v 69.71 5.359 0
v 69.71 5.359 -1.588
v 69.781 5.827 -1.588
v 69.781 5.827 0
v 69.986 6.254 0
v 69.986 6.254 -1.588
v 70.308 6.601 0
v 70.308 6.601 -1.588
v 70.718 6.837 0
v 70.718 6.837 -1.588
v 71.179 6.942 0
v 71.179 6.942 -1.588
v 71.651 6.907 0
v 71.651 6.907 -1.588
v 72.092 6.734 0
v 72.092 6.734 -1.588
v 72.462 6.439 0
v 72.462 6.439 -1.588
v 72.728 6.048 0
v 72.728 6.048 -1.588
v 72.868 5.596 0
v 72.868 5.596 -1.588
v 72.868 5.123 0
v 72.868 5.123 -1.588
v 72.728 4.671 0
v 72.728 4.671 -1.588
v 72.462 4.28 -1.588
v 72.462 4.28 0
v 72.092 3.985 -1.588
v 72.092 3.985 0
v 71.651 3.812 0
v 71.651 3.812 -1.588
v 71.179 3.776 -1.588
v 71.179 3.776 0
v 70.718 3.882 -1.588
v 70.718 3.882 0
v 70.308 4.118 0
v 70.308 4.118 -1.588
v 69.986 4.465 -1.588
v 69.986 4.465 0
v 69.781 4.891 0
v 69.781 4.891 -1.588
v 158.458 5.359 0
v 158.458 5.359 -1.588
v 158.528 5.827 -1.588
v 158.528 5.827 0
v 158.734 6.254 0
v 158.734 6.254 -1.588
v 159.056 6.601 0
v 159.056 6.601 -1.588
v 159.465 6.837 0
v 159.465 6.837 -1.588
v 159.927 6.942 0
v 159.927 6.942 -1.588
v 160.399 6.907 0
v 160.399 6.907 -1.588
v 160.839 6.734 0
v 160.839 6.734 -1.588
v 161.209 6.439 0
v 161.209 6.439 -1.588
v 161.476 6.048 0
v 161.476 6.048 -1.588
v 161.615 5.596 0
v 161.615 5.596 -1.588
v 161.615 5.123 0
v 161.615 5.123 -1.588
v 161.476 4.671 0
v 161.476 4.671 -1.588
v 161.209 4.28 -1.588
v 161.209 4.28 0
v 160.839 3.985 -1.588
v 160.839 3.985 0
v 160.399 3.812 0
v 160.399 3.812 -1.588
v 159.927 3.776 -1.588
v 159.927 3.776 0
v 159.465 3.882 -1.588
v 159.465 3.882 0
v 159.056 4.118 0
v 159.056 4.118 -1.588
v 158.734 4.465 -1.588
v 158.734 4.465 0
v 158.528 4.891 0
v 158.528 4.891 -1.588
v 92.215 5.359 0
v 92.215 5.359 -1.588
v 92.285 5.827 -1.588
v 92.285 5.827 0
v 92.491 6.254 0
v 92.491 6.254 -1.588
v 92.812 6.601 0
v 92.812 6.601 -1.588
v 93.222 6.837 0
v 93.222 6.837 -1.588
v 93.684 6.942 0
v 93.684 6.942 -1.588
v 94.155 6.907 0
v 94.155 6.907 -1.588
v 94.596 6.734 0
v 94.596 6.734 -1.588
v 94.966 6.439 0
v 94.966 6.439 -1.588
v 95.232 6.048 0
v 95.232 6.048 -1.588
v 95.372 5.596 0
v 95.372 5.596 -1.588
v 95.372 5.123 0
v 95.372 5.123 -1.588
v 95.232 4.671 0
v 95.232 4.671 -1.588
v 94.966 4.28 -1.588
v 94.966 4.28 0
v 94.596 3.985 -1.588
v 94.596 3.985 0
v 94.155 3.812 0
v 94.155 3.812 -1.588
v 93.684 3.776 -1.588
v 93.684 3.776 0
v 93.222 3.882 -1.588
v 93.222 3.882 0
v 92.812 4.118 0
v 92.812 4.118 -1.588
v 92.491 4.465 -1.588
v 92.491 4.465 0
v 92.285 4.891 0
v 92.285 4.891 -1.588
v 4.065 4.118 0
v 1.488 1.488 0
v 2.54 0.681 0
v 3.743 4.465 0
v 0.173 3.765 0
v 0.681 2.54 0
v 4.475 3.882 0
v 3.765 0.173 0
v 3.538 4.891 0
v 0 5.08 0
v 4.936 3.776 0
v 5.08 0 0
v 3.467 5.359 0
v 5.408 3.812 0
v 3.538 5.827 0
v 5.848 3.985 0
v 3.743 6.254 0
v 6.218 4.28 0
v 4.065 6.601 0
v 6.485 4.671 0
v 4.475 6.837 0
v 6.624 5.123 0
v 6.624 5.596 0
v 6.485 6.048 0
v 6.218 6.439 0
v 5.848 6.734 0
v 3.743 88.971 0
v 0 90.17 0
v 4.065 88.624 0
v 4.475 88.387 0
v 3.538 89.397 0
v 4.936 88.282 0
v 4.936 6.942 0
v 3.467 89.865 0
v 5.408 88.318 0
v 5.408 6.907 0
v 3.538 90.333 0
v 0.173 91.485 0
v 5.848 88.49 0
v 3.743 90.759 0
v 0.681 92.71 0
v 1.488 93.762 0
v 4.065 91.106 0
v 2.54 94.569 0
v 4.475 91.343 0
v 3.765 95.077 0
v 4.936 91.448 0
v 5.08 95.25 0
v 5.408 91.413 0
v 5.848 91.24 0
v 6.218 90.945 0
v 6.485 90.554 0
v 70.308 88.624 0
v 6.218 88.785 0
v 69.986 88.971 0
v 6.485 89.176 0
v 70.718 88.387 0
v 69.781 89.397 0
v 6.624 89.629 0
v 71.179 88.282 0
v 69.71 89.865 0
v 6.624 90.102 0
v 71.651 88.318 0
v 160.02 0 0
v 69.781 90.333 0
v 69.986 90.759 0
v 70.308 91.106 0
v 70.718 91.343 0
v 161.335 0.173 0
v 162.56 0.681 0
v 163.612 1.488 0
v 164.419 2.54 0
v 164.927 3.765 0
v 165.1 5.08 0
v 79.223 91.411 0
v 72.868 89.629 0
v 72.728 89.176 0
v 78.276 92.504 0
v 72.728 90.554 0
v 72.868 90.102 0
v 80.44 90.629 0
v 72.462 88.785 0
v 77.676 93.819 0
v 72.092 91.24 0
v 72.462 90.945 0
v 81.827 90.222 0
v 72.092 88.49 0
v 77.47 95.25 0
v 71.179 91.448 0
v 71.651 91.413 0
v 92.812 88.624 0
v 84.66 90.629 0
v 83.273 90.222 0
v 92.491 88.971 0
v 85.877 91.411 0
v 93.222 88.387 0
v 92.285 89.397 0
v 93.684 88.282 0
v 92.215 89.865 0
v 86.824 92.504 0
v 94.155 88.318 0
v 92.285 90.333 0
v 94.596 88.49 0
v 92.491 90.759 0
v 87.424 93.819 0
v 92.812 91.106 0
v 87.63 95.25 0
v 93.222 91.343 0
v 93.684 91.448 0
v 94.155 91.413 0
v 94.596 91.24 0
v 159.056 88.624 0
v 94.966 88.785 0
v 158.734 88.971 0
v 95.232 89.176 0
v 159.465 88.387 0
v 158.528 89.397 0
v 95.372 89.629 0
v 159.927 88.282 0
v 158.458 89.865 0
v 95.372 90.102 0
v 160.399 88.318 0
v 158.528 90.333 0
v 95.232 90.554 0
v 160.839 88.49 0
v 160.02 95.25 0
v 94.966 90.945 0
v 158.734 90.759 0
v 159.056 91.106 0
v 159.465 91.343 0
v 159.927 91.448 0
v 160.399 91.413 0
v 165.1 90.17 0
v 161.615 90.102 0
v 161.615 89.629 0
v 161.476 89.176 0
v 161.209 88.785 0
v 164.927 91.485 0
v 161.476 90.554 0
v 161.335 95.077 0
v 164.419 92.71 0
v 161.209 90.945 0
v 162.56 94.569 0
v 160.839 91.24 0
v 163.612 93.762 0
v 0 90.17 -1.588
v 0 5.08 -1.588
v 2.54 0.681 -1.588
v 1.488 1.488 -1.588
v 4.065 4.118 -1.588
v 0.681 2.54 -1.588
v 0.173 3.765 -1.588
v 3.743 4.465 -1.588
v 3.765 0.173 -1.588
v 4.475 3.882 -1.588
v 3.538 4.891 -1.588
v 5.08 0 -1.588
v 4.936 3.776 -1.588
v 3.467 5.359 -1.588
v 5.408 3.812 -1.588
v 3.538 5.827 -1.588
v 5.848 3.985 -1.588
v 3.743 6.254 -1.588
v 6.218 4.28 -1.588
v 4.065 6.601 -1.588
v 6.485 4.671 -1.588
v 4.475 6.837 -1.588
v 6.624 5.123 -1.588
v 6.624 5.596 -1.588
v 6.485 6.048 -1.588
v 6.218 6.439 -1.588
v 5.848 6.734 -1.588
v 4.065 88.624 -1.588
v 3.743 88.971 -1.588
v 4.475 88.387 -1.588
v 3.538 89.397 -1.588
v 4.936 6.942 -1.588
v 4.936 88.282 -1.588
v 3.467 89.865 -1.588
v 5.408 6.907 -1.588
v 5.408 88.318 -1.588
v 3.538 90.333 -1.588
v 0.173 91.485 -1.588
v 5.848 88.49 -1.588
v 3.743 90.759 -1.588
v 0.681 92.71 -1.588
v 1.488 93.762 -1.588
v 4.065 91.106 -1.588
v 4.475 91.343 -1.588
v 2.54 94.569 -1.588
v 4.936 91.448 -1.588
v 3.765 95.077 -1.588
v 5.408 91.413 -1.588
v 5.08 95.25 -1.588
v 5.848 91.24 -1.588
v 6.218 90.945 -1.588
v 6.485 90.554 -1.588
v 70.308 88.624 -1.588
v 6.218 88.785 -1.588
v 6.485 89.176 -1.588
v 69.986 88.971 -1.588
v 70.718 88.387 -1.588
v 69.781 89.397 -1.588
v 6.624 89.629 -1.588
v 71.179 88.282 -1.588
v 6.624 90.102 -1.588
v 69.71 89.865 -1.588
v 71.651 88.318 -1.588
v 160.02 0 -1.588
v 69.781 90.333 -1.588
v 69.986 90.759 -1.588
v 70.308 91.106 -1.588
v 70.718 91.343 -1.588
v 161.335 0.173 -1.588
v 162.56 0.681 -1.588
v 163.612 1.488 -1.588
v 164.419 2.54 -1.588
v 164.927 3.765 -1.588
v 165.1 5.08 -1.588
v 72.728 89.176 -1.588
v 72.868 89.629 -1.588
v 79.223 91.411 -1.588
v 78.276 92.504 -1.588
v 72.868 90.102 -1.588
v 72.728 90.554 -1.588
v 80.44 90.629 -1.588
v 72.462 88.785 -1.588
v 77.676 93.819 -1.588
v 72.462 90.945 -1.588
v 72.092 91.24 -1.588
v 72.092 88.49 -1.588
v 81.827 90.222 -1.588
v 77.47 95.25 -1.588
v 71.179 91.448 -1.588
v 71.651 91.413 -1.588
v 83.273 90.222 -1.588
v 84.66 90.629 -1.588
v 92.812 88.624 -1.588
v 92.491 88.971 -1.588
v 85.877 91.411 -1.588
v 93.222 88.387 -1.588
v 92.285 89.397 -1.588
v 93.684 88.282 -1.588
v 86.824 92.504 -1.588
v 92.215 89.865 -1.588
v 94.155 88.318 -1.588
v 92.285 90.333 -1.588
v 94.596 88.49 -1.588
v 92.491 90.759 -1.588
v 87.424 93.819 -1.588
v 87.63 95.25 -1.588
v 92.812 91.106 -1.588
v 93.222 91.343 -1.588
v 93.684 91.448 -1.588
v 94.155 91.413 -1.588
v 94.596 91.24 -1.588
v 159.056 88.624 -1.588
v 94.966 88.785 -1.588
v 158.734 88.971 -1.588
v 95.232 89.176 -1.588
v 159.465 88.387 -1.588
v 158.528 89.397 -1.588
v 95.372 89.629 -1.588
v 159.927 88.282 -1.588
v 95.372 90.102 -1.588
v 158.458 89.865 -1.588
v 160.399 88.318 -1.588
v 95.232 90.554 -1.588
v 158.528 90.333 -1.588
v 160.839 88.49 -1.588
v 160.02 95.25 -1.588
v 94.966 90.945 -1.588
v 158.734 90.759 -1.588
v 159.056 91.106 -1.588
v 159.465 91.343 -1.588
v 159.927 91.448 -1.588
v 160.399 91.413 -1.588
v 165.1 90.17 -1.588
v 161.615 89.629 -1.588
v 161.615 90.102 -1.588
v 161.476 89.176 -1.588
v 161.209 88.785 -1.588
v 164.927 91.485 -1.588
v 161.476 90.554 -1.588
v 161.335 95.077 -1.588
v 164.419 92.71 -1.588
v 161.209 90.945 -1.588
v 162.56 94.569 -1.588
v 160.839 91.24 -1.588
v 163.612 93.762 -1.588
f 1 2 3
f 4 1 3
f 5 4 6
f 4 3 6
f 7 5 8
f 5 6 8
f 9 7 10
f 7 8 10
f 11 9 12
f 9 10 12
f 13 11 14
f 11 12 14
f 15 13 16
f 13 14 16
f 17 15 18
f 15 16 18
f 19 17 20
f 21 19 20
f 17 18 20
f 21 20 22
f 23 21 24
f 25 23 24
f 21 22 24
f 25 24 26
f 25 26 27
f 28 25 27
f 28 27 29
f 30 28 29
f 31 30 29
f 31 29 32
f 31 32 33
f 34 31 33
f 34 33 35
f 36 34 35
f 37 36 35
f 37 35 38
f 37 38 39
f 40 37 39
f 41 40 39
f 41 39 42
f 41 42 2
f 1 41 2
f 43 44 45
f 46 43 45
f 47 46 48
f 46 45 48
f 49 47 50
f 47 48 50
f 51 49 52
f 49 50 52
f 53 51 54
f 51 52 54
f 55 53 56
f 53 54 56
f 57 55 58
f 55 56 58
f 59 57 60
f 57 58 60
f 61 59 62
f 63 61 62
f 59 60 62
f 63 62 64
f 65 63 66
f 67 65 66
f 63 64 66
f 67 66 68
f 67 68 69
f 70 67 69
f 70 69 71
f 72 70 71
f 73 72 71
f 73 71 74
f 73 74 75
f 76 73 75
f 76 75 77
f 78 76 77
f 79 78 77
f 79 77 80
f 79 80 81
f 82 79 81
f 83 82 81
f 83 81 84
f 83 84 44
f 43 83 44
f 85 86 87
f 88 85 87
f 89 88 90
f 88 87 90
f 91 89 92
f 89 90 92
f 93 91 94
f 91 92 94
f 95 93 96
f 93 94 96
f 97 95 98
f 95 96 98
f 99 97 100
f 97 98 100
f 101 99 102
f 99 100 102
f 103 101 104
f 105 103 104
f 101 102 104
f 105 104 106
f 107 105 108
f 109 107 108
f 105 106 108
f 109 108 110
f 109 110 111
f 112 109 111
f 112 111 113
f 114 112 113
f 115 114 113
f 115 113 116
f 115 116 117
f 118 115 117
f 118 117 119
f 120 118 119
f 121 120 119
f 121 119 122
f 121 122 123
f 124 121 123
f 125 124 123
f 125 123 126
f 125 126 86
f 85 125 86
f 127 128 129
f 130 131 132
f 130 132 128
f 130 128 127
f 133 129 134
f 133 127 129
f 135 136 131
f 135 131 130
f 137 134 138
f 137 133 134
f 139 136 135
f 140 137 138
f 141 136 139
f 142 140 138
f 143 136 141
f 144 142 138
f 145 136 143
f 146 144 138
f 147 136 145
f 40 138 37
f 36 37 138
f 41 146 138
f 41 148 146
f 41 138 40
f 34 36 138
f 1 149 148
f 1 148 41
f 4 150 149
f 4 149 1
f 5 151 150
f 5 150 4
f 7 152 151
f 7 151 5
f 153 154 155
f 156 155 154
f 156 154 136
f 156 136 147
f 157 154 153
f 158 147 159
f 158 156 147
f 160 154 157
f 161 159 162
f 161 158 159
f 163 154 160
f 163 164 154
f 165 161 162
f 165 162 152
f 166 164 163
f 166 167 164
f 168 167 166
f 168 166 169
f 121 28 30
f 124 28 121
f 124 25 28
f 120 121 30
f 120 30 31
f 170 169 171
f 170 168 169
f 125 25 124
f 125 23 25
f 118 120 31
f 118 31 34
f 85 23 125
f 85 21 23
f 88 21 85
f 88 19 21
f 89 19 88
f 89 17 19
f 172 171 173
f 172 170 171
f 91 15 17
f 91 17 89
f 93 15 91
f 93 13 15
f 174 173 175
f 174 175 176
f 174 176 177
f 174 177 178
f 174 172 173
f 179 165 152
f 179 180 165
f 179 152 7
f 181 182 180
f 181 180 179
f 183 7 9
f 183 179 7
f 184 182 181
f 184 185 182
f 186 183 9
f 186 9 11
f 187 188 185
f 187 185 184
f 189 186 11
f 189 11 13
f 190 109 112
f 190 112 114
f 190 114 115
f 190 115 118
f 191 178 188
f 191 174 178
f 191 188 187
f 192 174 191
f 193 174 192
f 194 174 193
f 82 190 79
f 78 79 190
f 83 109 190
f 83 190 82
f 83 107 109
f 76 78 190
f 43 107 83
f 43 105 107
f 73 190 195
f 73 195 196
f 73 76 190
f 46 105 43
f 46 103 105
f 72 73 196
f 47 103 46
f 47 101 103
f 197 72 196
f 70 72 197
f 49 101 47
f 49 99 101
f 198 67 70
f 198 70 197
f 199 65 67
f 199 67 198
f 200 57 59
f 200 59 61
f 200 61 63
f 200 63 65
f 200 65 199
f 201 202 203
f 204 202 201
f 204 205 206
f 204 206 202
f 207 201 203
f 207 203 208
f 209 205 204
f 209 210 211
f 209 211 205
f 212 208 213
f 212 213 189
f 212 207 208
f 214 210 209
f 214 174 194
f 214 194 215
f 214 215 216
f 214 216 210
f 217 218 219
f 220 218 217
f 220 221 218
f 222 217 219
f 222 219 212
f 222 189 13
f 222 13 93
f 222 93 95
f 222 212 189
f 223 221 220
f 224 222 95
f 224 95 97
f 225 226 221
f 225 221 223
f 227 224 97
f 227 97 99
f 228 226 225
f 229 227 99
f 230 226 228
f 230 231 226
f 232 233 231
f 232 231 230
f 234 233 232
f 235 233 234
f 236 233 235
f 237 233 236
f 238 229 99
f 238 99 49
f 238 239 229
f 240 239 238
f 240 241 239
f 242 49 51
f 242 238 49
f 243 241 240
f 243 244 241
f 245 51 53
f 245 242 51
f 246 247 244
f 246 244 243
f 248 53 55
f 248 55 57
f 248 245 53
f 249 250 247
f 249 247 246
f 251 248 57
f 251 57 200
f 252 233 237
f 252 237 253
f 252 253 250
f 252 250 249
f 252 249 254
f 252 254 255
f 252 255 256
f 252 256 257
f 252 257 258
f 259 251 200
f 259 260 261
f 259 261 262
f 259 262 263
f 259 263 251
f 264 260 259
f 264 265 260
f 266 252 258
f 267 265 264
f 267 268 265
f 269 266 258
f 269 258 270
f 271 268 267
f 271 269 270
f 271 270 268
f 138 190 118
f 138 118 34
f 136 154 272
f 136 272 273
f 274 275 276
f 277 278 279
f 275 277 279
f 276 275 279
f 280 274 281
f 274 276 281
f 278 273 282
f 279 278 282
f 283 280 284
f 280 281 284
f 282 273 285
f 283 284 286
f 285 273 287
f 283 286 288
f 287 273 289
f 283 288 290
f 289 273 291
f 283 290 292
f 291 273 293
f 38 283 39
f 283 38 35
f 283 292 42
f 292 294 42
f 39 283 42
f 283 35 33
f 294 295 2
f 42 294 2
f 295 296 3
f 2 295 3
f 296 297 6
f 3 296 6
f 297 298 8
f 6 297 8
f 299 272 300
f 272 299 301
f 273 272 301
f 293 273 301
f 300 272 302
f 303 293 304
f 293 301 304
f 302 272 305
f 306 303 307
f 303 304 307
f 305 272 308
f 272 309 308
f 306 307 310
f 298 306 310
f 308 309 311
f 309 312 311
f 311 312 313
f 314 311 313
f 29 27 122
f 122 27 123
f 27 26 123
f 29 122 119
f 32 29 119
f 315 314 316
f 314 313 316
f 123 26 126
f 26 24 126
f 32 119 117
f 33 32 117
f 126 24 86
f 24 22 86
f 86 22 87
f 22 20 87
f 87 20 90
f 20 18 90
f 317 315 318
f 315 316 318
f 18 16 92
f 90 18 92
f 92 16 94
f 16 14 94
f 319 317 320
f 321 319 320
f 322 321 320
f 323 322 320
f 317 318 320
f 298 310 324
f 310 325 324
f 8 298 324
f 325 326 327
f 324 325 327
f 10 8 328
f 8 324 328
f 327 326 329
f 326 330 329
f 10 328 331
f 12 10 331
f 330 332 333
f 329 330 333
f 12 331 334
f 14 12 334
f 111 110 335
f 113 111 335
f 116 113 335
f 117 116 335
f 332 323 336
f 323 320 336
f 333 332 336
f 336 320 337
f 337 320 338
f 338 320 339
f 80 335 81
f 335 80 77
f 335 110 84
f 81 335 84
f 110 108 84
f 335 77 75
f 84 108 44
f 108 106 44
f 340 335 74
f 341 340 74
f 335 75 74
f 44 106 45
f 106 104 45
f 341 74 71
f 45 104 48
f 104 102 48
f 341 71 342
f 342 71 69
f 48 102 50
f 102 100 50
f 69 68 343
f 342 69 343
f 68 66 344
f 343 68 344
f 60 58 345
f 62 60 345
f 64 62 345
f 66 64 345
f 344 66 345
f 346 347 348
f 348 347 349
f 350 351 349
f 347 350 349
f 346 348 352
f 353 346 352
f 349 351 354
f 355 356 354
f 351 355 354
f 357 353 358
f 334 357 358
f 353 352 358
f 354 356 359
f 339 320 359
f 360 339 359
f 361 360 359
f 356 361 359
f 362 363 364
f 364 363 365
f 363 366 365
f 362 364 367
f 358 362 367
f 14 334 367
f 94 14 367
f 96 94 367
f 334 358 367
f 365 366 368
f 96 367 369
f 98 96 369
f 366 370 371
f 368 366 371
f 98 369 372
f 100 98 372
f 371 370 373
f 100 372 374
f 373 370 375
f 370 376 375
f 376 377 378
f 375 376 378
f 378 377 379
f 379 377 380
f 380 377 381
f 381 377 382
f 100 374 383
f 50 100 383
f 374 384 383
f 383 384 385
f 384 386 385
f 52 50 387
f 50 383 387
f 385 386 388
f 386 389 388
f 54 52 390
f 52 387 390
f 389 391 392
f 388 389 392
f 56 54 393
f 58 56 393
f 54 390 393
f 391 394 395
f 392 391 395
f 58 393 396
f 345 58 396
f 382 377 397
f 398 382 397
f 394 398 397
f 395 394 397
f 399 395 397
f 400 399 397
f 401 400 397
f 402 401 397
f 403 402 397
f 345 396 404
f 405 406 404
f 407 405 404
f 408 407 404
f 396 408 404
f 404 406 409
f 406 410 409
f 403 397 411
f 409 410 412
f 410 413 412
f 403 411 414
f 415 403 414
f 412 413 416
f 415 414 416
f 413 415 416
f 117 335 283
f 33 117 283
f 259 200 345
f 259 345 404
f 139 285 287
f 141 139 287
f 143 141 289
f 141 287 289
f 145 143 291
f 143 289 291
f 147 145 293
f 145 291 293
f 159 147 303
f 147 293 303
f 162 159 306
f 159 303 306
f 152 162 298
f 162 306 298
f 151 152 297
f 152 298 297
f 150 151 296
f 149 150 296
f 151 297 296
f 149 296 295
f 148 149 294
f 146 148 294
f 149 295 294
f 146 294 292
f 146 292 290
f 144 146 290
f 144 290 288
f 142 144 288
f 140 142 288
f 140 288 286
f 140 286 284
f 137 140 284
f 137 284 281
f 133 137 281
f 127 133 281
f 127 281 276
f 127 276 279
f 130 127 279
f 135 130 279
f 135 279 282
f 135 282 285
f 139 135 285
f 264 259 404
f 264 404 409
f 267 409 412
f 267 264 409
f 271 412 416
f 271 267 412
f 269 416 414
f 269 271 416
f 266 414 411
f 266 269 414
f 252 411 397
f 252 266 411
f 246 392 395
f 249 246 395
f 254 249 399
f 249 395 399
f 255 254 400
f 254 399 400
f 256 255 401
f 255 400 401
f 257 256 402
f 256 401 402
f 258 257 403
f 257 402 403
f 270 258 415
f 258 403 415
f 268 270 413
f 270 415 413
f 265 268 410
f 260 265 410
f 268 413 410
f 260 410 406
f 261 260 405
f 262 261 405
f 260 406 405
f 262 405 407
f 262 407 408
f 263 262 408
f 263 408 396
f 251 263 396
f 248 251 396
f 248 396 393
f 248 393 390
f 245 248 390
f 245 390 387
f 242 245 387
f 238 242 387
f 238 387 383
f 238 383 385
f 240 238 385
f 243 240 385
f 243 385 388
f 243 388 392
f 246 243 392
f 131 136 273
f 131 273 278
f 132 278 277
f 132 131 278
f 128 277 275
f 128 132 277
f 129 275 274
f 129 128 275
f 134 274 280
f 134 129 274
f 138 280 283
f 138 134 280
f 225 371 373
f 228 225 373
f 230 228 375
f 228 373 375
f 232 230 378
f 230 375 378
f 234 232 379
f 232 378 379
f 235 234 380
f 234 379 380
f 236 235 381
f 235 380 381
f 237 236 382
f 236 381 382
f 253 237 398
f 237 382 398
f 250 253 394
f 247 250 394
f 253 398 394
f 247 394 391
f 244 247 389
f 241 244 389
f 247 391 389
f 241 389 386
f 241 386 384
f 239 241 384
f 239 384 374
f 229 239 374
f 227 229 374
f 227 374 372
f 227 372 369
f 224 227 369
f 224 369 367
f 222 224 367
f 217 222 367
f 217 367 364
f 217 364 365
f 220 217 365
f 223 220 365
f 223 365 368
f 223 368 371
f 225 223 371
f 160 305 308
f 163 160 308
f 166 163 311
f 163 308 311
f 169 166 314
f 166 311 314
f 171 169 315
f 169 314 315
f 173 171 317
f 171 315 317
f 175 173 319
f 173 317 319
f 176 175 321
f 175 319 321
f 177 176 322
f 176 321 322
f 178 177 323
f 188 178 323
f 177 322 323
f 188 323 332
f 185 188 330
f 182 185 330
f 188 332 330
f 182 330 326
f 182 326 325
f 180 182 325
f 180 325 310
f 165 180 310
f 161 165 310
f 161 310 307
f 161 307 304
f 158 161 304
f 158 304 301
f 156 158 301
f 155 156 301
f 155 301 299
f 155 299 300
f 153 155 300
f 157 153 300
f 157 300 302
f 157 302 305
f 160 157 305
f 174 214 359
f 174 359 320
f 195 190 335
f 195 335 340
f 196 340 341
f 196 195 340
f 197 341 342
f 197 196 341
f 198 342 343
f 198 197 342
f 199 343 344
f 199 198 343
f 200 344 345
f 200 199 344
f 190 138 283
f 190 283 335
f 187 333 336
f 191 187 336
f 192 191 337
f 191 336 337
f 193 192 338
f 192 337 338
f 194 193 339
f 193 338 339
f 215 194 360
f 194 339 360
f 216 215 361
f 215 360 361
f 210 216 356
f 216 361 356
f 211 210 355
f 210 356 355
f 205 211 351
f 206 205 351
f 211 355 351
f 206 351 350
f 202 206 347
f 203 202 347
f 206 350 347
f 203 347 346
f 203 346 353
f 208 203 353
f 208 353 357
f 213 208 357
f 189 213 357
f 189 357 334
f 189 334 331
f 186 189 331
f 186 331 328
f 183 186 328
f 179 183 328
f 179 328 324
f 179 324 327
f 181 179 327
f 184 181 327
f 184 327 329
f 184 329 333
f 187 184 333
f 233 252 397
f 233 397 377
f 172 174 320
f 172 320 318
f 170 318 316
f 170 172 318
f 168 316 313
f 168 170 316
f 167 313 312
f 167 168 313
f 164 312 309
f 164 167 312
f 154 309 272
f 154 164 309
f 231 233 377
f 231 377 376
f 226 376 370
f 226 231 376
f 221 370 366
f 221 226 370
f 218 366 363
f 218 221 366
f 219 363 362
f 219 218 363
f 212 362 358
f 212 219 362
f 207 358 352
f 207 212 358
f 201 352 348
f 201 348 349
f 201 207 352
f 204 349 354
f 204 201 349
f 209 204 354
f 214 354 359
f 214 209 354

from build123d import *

# Parameters (mm, degrees)
F1_DEPTH = 1.5875
F2_D     = 3.175


with BuildPart() as f1:
    # F0 (on Top) → F1 (new body)
    with BuildSketch(Plane.XY):
        with BuildLine():
            ThreePointArc((0, 5.08), (1.487898, 1.487898), (5.08, 0))
            Line((5.08, 0), (160.02, 0))
            ThreePointArc((160.02, 0), (163.612102, 1.487898), (165.1, 5.08))
            Line((165.1, 5.08), (165.1, 90.17))
            ThreePointArc((165.1, 90.17), (163.612102, 93.762102), (160.02, 95.25))
            Line((160.02, 95.25), (87.63, 95.25))
            ThreePointArc((87.63, 95.25), (82.55, 90.17), (77.47, 95.25))
            Line((77.47, 95.25), (5.08, 95.25))
            ThreePointArc((5.08, 95.25), (1.487898, 93.762102), (0, 90.17))
            Line((0, 90.17), (0, 5.08))
        make_face()
    extrude(amount=-F1_DEPTH)

    # F2 (through all)
    with Locations(Plane.XY):
        with Locations((5.0546, 5.3594), (71.2978, 5.3594), (93.8022, 5.3594), (160.0454, 5.3594), (160.0454, 89.8652), (93.8022, 89.8652), (71.2978, 89.8652), (5.0546, 89.8652)):
            Hole(F2_D / 2)


solid = f1.part
